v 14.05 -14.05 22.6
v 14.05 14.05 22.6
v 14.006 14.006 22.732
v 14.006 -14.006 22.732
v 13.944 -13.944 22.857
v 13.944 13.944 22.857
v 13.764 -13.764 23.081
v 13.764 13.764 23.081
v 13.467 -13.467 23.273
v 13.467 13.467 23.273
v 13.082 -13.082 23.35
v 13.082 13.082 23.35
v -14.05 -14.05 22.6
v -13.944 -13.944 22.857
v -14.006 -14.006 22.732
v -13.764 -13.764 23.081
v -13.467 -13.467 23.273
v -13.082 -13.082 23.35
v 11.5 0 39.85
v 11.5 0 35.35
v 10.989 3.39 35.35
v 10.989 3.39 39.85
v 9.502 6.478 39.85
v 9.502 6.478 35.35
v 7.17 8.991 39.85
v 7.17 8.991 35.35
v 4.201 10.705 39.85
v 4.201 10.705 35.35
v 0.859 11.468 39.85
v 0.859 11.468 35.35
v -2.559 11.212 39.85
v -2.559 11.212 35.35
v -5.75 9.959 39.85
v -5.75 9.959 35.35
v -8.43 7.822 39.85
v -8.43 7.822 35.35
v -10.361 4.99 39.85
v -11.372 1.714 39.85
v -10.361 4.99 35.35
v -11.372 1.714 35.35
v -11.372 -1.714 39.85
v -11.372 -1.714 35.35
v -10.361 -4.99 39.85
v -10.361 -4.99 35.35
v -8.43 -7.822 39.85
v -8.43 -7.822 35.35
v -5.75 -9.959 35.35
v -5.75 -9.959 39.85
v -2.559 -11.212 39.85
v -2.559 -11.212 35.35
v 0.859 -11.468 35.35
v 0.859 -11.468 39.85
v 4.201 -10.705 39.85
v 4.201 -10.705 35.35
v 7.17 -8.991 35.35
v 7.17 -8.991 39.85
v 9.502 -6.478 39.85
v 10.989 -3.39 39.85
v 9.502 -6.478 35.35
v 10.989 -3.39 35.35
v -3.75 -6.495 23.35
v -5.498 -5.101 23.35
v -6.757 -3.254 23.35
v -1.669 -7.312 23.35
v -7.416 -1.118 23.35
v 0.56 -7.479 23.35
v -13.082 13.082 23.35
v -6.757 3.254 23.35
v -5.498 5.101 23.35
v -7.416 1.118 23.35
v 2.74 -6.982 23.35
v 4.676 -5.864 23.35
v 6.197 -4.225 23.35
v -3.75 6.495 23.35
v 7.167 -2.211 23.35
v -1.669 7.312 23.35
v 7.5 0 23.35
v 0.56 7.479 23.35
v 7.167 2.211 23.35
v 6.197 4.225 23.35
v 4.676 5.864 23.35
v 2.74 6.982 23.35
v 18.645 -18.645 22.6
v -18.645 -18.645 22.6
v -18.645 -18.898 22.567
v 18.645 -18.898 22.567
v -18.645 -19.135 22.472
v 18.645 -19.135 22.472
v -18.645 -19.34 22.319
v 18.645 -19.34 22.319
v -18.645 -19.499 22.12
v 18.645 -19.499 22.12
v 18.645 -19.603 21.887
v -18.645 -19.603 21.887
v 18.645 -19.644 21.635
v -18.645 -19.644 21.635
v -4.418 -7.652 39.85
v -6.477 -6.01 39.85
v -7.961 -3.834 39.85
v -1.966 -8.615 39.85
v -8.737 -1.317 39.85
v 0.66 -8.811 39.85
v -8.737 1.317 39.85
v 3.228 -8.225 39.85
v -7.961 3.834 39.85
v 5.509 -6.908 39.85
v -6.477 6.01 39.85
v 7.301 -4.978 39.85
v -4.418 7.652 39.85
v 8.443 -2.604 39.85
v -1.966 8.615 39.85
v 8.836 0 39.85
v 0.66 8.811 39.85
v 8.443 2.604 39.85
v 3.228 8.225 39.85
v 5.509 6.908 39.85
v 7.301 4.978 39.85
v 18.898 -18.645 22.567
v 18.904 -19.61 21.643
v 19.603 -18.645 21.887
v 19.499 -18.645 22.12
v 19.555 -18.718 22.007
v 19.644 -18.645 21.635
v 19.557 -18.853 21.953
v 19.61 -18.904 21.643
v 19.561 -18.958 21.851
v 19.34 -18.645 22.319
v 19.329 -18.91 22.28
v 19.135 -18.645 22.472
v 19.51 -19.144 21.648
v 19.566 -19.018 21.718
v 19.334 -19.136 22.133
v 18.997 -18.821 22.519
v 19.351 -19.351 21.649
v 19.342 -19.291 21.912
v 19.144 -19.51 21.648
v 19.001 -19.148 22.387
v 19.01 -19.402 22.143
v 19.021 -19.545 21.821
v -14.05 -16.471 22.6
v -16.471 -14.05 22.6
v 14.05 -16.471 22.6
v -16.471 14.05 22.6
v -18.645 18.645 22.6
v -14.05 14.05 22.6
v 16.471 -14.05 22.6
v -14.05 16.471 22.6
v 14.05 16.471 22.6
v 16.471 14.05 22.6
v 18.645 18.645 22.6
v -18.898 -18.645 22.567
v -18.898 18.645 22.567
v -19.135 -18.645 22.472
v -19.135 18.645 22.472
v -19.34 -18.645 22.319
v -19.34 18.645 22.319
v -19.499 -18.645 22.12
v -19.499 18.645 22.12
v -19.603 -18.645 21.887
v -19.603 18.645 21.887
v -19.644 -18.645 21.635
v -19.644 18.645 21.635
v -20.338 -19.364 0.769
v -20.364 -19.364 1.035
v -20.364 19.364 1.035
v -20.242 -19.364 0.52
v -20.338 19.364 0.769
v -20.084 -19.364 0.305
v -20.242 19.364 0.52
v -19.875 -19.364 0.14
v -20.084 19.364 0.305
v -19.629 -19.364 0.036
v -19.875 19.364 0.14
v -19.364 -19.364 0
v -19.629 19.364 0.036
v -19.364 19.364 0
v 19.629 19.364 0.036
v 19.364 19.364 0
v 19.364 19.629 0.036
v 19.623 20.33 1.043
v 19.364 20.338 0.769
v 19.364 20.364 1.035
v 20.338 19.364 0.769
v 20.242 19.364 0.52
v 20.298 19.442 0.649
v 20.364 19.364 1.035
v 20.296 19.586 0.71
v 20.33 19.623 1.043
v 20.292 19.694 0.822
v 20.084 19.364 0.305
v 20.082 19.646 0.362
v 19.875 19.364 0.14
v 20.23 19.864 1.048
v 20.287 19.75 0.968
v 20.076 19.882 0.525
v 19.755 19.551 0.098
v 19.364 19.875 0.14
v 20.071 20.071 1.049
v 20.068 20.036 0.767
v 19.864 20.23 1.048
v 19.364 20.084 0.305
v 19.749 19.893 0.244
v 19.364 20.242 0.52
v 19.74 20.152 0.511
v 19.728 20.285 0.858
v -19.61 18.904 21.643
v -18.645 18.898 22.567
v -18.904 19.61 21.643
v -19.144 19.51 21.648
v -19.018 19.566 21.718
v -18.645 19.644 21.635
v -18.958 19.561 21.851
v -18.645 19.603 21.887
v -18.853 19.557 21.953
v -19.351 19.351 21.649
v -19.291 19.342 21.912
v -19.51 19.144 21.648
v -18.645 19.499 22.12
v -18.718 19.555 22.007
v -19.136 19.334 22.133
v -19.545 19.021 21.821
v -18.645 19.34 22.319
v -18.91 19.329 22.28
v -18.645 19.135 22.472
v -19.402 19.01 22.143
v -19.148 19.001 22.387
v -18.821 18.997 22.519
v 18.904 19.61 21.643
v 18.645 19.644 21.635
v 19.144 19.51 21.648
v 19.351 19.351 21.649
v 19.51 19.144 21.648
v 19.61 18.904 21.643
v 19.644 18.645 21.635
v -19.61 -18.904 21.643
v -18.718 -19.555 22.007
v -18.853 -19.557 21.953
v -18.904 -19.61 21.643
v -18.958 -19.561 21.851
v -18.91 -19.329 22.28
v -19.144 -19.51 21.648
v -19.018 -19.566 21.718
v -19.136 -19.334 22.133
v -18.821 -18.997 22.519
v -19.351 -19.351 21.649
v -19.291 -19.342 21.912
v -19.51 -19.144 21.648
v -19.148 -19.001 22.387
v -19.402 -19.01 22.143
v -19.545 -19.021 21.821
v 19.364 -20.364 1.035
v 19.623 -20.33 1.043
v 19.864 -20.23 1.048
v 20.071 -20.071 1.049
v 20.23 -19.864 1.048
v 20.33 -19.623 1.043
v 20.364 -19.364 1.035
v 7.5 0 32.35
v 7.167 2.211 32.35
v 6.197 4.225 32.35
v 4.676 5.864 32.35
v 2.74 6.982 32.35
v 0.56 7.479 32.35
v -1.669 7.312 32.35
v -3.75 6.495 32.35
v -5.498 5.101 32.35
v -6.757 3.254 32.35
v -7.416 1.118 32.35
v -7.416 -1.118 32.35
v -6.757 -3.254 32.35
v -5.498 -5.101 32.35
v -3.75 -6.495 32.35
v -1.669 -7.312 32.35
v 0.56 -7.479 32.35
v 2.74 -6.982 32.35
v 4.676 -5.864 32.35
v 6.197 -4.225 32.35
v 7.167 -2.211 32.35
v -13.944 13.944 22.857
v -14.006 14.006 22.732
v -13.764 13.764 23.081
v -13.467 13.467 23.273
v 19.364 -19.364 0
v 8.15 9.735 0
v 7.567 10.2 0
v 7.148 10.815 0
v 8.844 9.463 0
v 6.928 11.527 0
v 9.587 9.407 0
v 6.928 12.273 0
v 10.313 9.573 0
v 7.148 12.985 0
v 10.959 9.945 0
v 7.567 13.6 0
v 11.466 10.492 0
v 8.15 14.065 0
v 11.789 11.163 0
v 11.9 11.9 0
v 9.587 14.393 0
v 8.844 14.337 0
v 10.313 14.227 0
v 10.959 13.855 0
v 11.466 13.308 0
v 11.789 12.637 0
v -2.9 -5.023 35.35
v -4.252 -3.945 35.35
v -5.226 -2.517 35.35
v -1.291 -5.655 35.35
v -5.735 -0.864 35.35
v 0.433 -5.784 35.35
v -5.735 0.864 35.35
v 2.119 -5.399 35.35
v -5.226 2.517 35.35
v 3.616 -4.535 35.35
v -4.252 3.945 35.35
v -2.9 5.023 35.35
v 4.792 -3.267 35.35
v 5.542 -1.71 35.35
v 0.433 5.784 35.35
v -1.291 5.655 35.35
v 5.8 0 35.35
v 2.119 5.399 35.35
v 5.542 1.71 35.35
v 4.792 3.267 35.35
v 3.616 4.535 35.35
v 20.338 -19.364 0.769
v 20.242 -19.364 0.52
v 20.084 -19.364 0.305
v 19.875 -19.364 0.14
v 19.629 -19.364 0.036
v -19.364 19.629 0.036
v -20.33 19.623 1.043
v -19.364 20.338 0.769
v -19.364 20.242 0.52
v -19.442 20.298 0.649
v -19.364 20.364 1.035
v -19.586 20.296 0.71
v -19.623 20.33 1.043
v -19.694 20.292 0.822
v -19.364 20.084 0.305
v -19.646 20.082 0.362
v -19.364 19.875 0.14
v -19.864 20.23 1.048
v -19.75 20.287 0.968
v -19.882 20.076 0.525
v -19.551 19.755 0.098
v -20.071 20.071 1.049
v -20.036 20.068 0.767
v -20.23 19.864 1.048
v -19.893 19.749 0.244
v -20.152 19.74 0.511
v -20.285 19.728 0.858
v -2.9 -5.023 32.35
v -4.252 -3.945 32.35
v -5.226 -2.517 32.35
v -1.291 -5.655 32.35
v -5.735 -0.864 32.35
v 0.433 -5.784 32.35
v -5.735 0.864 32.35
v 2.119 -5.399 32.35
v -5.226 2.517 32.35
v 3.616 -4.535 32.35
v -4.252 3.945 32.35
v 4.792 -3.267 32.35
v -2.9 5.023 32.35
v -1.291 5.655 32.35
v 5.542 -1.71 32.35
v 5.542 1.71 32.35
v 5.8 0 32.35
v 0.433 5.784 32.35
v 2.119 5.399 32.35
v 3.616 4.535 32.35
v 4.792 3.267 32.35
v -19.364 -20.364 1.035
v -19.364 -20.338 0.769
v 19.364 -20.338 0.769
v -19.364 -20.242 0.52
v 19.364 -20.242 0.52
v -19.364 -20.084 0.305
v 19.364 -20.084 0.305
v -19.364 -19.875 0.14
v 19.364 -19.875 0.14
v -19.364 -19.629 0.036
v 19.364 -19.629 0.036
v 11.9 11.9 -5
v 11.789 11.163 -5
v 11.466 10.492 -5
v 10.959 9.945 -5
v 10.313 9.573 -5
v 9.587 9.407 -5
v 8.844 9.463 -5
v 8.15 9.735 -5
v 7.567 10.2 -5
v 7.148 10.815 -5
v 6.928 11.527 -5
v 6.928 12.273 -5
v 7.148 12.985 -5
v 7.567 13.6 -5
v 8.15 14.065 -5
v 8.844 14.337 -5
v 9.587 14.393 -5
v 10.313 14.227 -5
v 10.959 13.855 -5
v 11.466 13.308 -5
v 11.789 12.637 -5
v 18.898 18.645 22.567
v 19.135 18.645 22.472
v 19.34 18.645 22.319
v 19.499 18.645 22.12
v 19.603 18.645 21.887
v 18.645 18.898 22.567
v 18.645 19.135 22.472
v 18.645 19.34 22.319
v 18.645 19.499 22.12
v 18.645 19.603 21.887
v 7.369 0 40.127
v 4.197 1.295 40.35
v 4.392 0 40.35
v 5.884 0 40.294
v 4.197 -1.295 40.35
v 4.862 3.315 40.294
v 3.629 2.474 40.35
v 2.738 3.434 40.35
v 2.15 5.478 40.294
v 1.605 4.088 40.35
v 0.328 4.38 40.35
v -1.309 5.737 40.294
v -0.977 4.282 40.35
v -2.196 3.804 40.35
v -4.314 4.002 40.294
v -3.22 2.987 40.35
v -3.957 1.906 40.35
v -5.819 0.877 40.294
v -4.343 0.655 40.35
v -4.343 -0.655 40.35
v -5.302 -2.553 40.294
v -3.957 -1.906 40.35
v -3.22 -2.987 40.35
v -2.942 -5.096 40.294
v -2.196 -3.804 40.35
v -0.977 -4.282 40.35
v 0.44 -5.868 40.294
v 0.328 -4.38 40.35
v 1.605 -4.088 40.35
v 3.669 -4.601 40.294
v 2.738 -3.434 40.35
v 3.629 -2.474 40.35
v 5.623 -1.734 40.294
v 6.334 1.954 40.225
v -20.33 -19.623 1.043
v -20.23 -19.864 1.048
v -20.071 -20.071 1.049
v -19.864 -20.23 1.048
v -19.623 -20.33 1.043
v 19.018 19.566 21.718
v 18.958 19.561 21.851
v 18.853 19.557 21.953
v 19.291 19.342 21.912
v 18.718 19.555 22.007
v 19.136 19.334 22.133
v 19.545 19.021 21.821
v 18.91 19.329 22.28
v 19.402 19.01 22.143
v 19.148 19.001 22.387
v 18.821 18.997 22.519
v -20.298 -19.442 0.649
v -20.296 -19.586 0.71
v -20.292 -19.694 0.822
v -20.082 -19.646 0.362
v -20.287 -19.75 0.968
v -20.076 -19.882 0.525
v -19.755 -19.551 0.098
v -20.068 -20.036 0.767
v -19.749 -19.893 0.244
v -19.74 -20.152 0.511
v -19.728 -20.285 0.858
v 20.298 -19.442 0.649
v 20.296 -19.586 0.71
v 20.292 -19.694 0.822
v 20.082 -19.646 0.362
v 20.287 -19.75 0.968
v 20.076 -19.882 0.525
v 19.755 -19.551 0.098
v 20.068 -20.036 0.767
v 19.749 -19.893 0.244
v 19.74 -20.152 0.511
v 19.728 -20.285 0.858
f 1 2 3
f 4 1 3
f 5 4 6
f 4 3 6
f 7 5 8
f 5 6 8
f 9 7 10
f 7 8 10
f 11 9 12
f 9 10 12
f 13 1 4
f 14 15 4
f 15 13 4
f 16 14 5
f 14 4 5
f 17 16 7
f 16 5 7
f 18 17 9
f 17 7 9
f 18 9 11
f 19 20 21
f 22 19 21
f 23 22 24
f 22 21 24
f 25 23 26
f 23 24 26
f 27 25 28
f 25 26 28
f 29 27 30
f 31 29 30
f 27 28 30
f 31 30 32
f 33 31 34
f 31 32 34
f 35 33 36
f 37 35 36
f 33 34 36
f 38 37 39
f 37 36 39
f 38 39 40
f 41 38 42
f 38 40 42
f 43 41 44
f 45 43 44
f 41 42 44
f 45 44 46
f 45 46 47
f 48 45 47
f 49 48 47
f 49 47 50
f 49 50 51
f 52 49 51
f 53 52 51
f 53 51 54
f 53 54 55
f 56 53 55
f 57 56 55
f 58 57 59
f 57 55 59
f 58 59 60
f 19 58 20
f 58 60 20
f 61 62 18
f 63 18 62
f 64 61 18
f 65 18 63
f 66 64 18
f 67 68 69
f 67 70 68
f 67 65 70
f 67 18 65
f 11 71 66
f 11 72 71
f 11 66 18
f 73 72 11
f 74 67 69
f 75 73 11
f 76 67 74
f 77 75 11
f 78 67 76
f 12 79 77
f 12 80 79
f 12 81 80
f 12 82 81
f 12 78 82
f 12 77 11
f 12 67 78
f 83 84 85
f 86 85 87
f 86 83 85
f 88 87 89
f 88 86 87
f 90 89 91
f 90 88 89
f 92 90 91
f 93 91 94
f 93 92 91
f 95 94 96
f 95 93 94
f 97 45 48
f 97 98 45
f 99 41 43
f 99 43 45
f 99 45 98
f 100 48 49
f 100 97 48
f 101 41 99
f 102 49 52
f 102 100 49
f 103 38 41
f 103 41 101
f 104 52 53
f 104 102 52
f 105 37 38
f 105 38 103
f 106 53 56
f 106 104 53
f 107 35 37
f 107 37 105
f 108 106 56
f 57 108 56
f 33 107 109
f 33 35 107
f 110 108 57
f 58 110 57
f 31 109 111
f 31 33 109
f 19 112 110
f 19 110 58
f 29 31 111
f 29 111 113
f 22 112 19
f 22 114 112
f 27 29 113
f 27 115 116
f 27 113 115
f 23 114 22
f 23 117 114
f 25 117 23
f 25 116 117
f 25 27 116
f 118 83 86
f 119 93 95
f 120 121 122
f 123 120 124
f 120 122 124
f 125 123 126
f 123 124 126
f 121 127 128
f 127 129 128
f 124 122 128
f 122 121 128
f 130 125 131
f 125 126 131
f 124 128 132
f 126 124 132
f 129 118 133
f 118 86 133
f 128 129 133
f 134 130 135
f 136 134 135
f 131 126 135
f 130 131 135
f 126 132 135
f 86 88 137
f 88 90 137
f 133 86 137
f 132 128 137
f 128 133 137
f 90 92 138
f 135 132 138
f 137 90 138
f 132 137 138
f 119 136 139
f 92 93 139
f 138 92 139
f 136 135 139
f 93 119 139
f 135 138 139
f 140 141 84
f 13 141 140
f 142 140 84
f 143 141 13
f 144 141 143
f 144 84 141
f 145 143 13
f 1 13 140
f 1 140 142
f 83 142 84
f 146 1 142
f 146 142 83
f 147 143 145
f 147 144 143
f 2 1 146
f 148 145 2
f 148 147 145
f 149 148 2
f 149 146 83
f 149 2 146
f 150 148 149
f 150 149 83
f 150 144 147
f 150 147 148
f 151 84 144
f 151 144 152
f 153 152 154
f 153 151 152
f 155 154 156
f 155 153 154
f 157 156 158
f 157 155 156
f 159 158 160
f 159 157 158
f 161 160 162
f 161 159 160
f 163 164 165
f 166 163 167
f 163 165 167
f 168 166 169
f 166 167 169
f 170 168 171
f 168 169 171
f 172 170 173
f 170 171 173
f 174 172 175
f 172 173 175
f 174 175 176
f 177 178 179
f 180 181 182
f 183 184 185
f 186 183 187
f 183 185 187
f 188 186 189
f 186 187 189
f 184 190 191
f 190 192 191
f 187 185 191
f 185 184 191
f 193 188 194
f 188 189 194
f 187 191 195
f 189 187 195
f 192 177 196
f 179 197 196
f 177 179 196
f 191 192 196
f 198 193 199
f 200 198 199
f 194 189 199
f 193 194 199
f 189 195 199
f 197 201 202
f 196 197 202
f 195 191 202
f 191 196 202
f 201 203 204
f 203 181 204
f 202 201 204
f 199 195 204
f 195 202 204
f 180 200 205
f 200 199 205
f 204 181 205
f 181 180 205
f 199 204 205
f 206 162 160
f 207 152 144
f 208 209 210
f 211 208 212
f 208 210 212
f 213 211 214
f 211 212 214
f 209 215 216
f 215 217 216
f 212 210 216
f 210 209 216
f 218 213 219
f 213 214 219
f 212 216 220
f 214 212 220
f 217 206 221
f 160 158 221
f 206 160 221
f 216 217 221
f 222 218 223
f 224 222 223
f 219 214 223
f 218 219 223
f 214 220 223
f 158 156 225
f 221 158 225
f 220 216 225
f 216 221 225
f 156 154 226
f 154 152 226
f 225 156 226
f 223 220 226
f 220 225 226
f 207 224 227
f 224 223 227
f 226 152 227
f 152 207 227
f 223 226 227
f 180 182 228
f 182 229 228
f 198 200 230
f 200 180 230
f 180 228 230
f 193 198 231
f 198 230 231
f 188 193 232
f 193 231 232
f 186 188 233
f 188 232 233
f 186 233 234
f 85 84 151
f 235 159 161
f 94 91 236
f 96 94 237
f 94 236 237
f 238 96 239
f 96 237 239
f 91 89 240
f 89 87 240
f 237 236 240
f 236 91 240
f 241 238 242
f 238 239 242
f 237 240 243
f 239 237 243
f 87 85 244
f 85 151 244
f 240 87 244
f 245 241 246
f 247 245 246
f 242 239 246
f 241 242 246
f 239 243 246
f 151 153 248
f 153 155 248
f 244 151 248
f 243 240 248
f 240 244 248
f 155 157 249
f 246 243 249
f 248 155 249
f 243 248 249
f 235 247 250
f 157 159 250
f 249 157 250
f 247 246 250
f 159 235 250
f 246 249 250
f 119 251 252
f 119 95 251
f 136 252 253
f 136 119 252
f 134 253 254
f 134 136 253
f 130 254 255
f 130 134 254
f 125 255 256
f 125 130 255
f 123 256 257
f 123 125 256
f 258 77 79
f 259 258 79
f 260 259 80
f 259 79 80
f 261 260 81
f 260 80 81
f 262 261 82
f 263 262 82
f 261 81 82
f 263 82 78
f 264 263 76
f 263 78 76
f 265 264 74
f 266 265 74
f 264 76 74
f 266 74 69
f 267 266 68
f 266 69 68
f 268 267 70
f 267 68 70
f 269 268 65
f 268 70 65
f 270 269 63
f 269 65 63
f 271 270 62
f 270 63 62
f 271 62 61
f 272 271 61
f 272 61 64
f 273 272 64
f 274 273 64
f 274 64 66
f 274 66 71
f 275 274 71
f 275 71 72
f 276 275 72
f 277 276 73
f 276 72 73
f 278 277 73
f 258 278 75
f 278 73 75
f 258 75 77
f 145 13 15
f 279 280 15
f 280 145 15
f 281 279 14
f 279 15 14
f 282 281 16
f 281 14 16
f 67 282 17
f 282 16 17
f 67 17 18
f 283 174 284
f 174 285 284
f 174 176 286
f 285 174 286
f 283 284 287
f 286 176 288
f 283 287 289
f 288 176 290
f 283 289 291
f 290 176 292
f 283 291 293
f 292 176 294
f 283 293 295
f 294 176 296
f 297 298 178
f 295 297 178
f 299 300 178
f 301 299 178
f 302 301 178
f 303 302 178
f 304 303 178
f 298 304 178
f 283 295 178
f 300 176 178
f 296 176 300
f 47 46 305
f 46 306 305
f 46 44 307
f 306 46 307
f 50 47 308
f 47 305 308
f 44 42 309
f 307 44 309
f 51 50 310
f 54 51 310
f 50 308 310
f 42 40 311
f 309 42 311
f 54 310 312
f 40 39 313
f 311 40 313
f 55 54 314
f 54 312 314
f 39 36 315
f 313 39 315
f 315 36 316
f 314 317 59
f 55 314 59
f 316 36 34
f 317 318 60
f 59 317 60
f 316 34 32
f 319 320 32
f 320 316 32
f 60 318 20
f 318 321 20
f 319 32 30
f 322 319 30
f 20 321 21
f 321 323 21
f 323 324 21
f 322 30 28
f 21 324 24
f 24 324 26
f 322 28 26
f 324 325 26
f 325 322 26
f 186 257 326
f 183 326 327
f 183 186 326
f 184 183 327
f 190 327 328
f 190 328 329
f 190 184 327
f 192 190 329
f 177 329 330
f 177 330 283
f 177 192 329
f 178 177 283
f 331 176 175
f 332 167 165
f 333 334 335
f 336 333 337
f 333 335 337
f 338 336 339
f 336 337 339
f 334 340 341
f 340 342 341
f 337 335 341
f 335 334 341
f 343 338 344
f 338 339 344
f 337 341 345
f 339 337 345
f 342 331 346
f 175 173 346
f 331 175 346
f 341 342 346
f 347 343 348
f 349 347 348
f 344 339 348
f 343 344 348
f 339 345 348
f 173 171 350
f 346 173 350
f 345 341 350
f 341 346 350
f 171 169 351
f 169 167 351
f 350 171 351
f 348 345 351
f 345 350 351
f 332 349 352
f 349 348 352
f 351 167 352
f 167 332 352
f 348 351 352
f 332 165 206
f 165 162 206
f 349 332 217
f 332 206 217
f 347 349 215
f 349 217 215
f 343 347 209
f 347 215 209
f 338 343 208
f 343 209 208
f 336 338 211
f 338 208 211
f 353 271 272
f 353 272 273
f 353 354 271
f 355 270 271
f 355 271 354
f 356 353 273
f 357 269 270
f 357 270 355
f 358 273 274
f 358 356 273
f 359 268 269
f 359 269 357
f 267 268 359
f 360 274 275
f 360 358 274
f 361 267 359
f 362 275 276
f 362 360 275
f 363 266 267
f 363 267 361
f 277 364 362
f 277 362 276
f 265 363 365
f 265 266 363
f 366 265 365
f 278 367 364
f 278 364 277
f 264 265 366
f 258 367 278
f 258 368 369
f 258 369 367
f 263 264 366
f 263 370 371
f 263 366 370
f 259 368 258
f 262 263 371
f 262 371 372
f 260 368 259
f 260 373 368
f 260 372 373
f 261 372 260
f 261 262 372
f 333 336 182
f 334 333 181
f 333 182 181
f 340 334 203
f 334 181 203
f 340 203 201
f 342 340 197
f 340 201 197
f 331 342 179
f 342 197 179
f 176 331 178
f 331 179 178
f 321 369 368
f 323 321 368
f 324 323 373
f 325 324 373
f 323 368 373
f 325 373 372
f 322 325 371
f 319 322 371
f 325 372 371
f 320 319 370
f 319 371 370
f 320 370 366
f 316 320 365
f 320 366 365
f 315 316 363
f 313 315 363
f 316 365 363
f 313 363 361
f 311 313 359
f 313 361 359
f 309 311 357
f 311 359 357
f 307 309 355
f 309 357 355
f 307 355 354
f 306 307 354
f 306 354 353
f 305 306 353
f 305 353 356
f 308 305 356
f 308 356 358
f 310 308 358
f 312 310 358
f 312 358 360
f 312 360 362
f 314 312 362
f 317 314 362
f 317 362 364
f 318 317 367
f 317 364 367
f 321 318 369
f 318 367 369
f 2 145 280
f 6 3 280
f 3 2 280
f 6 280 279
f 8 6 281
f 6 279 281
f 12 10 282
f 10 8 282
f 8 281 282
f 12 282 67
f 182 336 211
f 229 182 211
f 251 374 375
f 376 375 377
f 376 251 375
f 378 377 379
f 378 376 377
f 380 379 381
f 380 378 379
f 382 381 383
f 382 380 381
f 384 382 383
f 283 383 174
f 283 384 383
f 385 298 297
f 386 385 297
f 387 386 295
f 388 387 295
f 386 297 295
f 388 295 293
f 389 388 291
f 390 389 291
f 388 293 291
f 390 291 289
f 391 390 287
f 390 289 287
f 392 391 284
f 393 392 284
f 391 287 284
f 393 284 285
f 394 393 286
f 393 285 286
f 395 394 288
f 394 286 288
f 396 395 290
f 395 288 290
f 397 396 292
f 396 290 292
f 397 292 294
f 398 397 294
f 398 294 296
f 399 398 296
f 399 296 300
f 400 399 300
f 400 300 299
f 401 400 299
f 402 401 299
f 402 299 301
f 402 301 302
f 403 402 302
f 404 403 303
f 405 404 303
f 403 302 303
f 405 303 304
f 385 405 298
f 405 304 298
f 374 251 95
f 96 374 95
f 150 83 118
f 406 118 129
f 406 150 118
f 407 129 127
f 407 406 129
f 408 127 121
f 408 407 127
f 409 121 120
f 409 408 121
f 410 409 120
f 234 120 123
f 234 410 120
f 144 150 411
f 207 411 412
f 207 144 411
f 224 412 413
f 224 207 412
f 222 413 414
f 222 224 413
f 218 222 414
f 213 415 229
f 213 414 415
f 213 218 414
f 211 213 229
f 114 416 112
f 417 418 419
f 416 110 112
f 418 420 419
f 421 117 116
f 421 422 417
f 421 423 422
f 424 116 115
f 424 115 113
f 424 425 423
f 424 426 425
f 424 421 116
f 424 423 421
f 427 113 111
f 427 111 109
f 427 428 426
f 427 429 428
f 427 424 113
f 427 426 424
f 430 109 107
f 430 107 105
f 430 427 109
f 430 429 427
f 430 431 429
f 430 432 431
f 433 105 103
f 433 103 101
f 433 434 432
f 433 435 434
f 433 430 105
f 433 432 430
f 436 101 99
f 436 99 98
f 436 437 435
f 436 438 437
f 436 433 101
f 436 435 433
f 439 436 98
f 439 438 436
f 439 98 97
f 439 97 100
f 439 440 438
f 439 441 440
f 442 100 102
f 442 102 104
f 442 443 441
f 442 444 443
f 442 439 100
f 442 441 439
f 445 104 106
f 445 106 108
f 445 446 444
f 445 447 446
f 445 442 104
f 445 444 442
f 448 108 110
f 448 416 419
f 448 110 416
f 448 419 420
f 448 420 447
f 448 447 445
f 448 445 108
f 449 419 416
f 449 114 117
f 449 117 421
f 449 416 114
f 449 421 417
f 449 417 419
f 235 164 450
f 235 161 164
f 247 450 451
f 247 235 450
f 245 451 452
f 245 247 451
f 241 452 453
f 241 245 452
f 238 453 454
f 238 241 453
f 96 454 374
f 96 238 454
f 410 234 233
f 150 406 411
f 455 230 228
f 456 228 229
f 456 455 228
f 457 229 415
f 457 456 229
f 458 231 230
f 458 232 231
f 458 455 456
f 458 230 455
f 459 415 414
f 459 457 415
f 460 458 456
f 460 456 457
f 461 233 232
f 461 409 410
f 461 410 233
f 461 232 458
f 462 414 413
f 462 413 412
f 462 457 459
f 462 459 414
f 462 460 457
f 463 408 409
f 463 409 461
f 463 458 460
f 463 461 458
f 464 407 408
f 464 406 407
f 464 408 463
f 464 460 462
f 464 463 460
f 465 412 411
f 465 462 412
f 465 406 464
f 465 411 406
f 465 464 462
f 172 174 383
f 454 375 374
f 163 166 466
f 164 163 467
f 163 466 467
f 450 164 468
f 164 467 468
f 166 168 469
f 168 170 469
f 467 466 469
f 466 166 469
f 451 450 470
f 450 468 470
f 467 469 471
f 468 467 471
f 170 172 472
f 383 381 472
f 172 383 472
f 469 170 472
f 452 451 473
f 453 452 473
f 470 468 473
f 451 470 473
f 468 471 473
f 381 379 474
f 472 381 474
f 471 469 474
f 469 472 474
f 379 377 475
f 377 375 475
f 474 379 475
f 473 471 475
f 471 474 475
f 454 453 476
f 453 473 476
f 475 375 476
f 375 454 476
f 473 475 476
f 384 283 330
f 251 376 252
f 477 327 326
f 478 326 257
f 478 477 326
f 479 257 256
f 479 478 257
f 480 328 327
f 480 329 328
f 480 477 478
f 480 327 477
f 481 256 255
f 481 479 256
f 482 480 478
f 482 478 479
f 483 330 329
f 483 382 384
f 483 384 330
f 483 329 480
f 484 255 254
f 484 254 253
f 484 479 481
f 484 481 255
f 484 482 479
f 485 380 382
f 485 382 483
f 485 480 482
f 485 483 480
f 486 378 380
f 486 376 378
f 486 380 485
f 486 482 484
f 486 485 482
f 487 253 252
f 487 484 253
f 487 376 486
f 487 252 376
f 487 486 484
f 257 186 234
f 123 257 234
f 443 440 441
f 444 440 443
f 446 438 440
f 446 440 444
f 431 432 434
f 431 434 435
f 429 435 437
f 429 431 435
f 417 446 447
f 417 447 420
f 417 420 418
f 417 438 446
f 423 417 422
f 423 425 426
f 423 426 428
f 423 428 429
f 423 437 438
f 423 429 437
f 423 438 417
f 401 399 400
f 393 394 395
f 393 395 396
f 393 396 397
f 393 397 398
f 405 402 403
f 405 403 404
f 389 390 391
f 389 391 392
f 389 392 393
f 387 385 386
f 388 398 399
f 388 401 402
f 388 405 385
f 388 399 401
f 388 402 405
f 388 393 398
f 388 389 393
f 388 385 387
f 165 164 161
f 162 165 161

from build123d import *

# Parameters (mm, degrees)
CROQUIS1_W               = 40.8
CROQUIS1_H               = 40.8
SALIENTE_EXTRUIR1_DEPTH  = 22.6
SALIENTE_EXTRUIR1_TAPER  = 2
CROQUIS2_W               = 28.1
CROQUIS2_H               = 28.1
SALIENTE_EXTRUIR2_DEPTH  = 0.75
REDONDEO1_R              = 1
CROQUIS3_R               = 7.5
SALIENTE_EXTRUIR3_DEPTH  = 9
CROQUIS4_R               = 5.8
SALIENTE_EXTRUIR4_DEPTH  = 3
CROQUIS7_R               = 2.5
SALIENTE_EXTRUIR7_DEPTH  = 5
REDONDEO5_R              = 1
CROQUIS16_R              = 11.5
SALIENTE_EXTRUIR12_DEPTH = 4.5
CROQUIS17_R              = 8.836056804
SALIENTE_EXTRUIR13_DEPTH = 0.5
REDONDEO9_R              = 20


with BuildPart() as part:
    # Croquis1 → Saliente-Extruir1 (new body)
    with BuildSketch(Plane.XY):
        Rectangle(CROQUIS1_W, CROQUIS1_H)
    extrude(amount=SALIENTE_EXTRUIR1_DEPTH, taper=SALIENTE_EXTRUIR1_TAPER)

    # Croquis2 → Saliente-Extruir2 (add, symmetric)
    with BuildSketch(Plane.XY.offset(22.6)):
        Rectangle(CROQUIS2_W, CROQUIS2_H)
    extrude(amount=SALIENTE_EXTRUIR2_DEPTH, both=True)

    # Redondeo1
    # the kernel refuses this fillet: 1 mm, written as the material it takes off along each edge
    with BuildSketch(Plane(origin=(14.05, 16.470614591, 23.35), x_dir=(0, 0, -1), z_dir=(0, -1, 0)), Plane(origin=(-16.470614591, 14.05, 23.35), x_dir=(0, 0, -1), z_dir=(1, 0, 0)), Plane(origin=(16.470614591, -14.05, 23.35), x_dir=(0, 0, -1), z_dir=(-1, 0, 0)), Plane(origin=(-14.05, -16.470614591, 23.35), x_dir=(0, 0, -1), z_dir=(0, 1, 0))) as redondeo1_piece_1:
        with BuildLine():
            CenterArc((1, -0.968245837), REDONDEO1_R, 104.477512186, 75.522487814)
            Line((0, -0.968245837), (-0.02, -0.968245837))
            Line((-0.02, -0.968245837), (-0.02, 0))
            Line((-0.02, 0), (0, 0.02))
            ThreePointArc((0, 0.02), (0.375, 0.02), (0.745, 0.019364917))
            Line((0.745, 0.019364917), (0.75, 0))
        make_face()
    extrude(amount=32.941229183, mode=Mode.SUBTRACT)

    # Croquis3 → Saliente-Extruir3 (add)
    with BuildSketch(Plane.XY.offset(23.35)):
        Circle(CROQUIS3_R)
    extrude(amount=SALIENTE_EXTRUIR3_DEPTH)

    # Croquis4 → Saliente-Extruir4 (add)
    with BuildSketch(Plane.XY.offset(32.35)):
        Circle(CROQUIS4_R)
    extrude(amount=SALIENTE_EXTRUIR4_DEPTH)

    # Croquis7 → Saliente-Extruir7 (add)
    with BuildSketch(Plane(origin=(0, 0, 0), x_dir=(-1, 0, 0), z_dir=(0, 0, -1))):
        with Locations(Location((-9.4, 11.9, 0), (0, 0, 180))):
            Circle(CROQUIS7_R)
    extrude(amount=SALIENTE_EXTRUIR7_DEPTH)

    # Redondeo5
    redondeo5_edges = [part.edges().sort_by_distance(p)[0] for p in [
        (-19.610790609, 0, 22.6),
        (0, -19.610790609, 22.6),
        (19.610790609, 0, 22.6),
        (0, -20.4, 0),
        (-20.4, 0, 0),
        (0, 20.4, 0),
        (20.4, 0, 0),
        (20.005395305, -20.005395305, 11.3),
        (-20.005394843, -20.005394843, 11.300013228),
        (-20.005395305, 20.005395305, 11.3),
        (20.005394843, 20.005394843, 11.300013228),
        (0, 19.610790609, 22.6),
    ]]
    fillet(redondeo5_edges, radius=REDONDEO5_R)

    # Croquis16 → Saliente-Extruir12 (add)
    with BuildSketch(Plane.XY.offset(35.35)):
        Circle(CROQUIS16_R)
    extrude(amount=SALIENTE_EXTRUIR12_DEPTH)

    # Croquis17 → Saliente-Extruir13 (add)
    with BuildSketch(Plane.XY.offset(39.85)):
        Circle(CROQUIS17_R)
    extrude(amount=SALIENTE_EXTRUIR13_DEPTH)

    # Redondeo9
    # the kernel refuses this fillet: 20 mm, written as the material it takes off along each edge
    with BuildSketch(Plane(origin=(0, 0, 40.35), x_dir=(1, 0, 0), z_dir=(0, -1, 0))) as redondeo9_piece_1:
        with BuildLine():
            CenterArc((4.391959596, -20), REDONDEO9_R, 77.161431859, 12.838568141)
            Line((4.391959596, 0), (4.391959596, 0.4))
            Line((4.391959596, 0.4), (8.836056804, 0.4))
            Line((8.836056804, 0.4), (9.236056804, 0))
            ThreePointArc((9.236056804, 0), (9.236056804, -0.25), (8.924938748, -0.11))
            Line((8.924938748, -0.11), (8.836056804, -0.5))
        make_face()
    revolve(axis=Axis((0, 0, 40.35), (0, 0, 1)), mode=Mode.SUBTRACT)


solid = part.part
